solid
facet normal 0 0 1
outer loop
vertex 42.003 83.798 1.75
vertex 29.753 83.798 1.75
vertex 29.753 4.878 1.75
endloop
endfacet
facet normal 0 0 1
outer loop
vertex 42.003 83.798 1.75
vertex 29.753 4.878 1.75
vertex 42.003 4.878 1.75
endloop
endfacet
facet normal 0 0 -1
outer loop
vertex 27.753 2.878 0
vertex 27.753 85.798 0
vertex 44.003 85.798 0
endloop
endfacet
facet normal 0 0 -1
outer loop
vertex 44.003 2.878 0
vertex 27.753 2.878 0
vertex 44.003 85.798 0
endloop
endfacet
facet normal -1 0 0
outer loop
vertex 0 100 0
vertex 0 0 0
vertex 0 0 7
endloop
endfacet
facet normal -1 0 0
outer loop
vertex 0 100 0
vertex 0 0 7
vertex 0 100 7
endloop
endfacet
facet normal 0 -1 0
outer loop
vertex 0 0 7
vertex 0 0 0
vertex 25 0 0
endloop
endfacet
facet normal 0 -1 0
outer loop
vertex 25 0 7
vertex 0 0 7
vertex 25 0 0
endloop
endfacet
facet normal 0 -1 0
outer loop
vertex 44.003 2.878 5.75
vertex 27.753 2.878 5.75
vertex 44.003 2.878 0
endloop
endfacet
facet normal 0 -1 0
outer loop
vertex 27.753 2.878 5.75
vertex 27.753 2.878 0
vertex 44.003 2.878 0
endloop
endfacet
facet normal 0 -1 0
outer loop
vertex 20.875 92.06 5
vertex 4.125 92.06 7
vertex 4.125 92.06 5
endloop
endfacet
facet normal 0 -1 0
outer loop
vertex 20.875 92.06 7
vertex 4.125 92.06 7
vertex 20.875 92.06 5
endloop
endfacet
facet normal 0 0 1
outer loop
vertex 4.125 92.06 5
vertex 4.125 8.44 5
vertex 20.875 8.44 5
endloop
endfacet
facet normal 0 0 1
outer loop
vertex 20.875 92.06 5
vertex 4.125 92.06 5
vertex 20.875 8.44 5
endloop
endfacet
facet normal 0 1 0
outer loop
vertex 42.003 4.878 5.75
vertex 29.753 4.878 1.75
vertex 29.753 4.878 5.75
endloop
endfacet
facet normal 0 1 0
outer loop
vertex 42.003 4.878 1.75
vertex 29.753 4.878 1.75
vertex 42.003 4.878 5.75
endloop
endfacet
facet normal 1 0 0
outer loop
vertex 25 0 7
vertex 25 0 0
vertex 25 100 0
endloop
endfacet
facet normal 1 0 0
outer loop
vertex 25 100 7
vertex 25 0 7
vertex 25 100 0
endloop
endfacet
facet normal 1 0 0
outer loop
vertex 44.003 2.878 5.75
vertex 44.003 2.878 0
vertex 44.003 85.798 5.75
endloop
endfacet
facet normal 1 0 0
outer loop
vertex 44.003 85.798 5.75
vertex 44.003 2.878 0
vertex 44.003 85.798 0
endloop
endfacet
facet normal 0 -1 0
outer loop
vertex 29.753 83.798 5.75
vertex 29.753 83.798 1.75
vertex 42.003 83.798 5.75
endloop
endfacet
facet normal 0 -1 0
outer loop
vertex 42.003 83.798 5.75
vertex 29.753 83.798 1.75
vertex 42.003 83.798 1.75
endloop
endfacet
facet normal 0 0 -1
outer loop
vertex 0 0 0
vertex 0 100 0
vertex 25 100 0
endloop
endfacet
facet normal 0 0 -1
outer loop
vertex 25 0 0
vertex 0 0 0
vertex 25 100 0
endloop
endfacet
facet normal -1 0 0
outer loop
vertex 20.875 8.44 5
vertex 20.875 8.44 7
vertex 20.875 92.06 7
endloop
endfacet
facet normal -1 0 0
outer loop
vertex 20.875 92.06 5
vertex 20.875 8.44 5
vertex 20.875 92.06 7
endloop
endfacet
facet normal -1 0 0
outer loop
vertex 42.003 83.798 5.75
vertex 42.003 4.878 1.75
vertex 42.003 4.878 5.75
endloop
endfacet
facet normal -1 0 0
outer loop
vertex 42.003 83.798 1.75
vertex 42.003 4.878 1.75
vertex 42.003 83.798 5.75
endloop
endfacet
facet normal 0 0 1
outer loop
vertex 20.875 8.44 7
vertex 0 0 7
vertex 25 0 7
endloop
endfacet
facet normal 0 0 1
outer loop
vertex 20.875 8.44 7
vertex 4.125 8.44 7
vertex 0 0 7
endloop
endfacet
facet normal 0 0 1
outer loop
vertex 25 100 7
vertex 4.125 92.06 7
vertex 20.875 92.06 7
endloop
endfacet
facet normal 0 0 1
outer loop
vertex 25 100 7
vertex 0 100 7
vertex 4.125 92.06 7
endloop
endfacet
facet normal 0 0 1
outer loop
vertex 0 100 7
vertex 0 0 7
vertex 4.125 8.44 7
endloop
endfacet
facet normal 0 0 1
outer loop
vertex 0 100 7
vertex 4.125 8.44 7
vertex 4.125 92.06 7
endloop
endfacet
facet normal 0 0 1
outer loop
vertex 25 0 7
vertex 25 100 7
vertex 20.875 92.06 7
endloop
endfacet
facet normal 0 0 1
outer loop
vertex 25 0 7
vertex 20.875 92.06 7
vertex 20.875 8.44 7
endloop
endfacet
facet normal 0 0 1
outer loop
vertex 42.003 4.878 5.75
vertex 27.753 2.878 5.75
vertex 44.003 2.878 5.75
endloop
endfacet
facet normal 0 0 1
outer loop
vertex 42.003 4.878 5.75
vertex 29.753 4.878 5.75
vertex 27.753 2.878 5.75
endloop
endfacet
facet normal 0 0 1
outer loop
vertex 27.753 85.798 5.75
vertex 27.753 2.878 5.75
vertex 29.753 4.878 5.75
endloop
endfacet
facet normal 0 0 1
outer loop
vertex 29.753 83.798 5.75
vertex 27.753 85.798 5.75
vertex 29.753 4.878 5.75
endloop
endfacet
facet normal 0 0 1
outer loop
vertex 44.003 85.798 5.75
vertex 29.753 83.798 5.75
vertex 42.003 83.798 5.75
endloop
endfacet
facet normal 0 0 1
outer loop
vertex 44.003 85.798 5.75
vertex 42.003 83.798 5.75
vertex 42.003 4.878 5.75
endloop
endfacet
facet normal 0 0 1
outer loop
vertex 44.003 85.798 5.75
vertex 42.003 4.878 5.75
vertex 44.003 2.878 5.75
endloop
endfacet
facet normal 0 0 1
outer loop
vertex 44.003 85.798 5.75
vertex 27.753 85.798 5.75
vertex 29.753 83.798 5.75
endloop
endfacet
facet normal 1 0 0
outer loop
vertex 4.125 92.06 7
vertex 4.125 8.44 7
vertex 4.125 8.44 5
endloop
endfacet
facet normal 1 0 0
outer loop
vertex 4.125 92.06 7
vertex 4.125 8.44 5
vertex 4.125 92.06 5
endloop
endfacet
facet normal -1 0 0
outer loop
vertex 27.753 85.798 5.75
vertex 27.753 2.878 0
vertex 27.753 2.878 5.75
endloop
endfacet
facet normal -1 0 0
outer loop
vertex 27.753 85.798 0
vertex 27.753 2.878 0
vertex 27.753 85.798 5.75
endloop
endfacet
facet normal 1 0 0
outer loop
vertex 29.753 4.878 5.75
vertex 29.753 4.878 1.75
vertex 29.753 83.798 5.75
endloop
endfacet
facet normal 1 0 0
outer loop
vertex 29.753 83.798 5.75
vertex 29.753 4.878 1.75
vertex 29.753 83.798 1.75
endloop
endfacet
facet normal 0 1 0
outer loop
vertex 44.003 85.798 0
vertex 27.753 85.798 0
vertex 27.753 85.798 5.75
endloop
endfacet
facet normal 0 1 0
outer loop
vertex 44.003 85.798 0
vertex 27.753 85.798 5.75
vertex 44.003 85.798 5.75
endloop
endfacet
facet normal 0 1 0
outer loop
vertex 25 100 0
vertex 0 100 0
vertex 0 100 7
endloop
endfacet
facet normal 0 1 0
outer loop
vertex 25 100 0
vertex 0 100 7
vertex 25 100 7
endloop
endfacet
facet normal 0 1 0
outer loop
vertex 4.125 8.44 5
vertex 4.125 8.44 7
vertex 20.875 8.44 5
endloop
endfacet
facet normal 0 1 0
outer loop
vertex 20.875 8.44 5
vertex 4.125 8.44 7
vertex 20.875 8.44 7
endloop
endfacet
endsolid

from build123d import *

# Parameters (mm, degrees)
F0_W     = 25
F0_H     = 100
F1_DEPTH = 7
F2_W     = 16.75
F2_H     = 83.62
F3_DEPTH = 2
F4_W     = 16.25
F4_H     = 82.92
F5_DEPTH = 1.75
F6_W     = 16.25
F6_H     = 82.92
F6_W_2   = 12.25
F6_H_2   = 78.92
F7_DEPTH = 4


with BuildPart() as f1:
    # F0 (on Top) → F1 (new body)
    with BuildSketch(Plane.XY):
        with Locations((12.5, 50)):
            Rectangle(F0_W, F0_H)
    extrude(amount=F1_DEPTH)

    # F2 (on face) → F3 (cut)
    with BuildSketch(Plane.XY.offset(7)):
        with Locations((12.5, 50.25)):
            Rectangle(F2_W, F2_H)
    extrude(amount=-F3_DEPTH, mode=Mode.SUBTRACT)


with BuildPart() as f5:
    # F4 (on Top) → F5 (new body)
    with BuildSketch(Plane.XY):
        with Locations((35.877641, 44.338047)):
            Rectangle(F4_W, F4_H)
    extrude(amount=F5_DEPTH)

    # F6 (on face) → F7 (join)
    with BuildSketch(Plane.XY.offset(1.75)):
        with Locations((35.877641, 44.338047)):
            Rectangle(F6_W, F6_H)
        with Locations((35.877641, 44.338047)):
            Rectangle(F6_W_2, F6_H_2, mode=Mode.SUBTRACT)
    extrude(amount=F7_DEPTH)


solid = Compound([f1.part, f5.part])
